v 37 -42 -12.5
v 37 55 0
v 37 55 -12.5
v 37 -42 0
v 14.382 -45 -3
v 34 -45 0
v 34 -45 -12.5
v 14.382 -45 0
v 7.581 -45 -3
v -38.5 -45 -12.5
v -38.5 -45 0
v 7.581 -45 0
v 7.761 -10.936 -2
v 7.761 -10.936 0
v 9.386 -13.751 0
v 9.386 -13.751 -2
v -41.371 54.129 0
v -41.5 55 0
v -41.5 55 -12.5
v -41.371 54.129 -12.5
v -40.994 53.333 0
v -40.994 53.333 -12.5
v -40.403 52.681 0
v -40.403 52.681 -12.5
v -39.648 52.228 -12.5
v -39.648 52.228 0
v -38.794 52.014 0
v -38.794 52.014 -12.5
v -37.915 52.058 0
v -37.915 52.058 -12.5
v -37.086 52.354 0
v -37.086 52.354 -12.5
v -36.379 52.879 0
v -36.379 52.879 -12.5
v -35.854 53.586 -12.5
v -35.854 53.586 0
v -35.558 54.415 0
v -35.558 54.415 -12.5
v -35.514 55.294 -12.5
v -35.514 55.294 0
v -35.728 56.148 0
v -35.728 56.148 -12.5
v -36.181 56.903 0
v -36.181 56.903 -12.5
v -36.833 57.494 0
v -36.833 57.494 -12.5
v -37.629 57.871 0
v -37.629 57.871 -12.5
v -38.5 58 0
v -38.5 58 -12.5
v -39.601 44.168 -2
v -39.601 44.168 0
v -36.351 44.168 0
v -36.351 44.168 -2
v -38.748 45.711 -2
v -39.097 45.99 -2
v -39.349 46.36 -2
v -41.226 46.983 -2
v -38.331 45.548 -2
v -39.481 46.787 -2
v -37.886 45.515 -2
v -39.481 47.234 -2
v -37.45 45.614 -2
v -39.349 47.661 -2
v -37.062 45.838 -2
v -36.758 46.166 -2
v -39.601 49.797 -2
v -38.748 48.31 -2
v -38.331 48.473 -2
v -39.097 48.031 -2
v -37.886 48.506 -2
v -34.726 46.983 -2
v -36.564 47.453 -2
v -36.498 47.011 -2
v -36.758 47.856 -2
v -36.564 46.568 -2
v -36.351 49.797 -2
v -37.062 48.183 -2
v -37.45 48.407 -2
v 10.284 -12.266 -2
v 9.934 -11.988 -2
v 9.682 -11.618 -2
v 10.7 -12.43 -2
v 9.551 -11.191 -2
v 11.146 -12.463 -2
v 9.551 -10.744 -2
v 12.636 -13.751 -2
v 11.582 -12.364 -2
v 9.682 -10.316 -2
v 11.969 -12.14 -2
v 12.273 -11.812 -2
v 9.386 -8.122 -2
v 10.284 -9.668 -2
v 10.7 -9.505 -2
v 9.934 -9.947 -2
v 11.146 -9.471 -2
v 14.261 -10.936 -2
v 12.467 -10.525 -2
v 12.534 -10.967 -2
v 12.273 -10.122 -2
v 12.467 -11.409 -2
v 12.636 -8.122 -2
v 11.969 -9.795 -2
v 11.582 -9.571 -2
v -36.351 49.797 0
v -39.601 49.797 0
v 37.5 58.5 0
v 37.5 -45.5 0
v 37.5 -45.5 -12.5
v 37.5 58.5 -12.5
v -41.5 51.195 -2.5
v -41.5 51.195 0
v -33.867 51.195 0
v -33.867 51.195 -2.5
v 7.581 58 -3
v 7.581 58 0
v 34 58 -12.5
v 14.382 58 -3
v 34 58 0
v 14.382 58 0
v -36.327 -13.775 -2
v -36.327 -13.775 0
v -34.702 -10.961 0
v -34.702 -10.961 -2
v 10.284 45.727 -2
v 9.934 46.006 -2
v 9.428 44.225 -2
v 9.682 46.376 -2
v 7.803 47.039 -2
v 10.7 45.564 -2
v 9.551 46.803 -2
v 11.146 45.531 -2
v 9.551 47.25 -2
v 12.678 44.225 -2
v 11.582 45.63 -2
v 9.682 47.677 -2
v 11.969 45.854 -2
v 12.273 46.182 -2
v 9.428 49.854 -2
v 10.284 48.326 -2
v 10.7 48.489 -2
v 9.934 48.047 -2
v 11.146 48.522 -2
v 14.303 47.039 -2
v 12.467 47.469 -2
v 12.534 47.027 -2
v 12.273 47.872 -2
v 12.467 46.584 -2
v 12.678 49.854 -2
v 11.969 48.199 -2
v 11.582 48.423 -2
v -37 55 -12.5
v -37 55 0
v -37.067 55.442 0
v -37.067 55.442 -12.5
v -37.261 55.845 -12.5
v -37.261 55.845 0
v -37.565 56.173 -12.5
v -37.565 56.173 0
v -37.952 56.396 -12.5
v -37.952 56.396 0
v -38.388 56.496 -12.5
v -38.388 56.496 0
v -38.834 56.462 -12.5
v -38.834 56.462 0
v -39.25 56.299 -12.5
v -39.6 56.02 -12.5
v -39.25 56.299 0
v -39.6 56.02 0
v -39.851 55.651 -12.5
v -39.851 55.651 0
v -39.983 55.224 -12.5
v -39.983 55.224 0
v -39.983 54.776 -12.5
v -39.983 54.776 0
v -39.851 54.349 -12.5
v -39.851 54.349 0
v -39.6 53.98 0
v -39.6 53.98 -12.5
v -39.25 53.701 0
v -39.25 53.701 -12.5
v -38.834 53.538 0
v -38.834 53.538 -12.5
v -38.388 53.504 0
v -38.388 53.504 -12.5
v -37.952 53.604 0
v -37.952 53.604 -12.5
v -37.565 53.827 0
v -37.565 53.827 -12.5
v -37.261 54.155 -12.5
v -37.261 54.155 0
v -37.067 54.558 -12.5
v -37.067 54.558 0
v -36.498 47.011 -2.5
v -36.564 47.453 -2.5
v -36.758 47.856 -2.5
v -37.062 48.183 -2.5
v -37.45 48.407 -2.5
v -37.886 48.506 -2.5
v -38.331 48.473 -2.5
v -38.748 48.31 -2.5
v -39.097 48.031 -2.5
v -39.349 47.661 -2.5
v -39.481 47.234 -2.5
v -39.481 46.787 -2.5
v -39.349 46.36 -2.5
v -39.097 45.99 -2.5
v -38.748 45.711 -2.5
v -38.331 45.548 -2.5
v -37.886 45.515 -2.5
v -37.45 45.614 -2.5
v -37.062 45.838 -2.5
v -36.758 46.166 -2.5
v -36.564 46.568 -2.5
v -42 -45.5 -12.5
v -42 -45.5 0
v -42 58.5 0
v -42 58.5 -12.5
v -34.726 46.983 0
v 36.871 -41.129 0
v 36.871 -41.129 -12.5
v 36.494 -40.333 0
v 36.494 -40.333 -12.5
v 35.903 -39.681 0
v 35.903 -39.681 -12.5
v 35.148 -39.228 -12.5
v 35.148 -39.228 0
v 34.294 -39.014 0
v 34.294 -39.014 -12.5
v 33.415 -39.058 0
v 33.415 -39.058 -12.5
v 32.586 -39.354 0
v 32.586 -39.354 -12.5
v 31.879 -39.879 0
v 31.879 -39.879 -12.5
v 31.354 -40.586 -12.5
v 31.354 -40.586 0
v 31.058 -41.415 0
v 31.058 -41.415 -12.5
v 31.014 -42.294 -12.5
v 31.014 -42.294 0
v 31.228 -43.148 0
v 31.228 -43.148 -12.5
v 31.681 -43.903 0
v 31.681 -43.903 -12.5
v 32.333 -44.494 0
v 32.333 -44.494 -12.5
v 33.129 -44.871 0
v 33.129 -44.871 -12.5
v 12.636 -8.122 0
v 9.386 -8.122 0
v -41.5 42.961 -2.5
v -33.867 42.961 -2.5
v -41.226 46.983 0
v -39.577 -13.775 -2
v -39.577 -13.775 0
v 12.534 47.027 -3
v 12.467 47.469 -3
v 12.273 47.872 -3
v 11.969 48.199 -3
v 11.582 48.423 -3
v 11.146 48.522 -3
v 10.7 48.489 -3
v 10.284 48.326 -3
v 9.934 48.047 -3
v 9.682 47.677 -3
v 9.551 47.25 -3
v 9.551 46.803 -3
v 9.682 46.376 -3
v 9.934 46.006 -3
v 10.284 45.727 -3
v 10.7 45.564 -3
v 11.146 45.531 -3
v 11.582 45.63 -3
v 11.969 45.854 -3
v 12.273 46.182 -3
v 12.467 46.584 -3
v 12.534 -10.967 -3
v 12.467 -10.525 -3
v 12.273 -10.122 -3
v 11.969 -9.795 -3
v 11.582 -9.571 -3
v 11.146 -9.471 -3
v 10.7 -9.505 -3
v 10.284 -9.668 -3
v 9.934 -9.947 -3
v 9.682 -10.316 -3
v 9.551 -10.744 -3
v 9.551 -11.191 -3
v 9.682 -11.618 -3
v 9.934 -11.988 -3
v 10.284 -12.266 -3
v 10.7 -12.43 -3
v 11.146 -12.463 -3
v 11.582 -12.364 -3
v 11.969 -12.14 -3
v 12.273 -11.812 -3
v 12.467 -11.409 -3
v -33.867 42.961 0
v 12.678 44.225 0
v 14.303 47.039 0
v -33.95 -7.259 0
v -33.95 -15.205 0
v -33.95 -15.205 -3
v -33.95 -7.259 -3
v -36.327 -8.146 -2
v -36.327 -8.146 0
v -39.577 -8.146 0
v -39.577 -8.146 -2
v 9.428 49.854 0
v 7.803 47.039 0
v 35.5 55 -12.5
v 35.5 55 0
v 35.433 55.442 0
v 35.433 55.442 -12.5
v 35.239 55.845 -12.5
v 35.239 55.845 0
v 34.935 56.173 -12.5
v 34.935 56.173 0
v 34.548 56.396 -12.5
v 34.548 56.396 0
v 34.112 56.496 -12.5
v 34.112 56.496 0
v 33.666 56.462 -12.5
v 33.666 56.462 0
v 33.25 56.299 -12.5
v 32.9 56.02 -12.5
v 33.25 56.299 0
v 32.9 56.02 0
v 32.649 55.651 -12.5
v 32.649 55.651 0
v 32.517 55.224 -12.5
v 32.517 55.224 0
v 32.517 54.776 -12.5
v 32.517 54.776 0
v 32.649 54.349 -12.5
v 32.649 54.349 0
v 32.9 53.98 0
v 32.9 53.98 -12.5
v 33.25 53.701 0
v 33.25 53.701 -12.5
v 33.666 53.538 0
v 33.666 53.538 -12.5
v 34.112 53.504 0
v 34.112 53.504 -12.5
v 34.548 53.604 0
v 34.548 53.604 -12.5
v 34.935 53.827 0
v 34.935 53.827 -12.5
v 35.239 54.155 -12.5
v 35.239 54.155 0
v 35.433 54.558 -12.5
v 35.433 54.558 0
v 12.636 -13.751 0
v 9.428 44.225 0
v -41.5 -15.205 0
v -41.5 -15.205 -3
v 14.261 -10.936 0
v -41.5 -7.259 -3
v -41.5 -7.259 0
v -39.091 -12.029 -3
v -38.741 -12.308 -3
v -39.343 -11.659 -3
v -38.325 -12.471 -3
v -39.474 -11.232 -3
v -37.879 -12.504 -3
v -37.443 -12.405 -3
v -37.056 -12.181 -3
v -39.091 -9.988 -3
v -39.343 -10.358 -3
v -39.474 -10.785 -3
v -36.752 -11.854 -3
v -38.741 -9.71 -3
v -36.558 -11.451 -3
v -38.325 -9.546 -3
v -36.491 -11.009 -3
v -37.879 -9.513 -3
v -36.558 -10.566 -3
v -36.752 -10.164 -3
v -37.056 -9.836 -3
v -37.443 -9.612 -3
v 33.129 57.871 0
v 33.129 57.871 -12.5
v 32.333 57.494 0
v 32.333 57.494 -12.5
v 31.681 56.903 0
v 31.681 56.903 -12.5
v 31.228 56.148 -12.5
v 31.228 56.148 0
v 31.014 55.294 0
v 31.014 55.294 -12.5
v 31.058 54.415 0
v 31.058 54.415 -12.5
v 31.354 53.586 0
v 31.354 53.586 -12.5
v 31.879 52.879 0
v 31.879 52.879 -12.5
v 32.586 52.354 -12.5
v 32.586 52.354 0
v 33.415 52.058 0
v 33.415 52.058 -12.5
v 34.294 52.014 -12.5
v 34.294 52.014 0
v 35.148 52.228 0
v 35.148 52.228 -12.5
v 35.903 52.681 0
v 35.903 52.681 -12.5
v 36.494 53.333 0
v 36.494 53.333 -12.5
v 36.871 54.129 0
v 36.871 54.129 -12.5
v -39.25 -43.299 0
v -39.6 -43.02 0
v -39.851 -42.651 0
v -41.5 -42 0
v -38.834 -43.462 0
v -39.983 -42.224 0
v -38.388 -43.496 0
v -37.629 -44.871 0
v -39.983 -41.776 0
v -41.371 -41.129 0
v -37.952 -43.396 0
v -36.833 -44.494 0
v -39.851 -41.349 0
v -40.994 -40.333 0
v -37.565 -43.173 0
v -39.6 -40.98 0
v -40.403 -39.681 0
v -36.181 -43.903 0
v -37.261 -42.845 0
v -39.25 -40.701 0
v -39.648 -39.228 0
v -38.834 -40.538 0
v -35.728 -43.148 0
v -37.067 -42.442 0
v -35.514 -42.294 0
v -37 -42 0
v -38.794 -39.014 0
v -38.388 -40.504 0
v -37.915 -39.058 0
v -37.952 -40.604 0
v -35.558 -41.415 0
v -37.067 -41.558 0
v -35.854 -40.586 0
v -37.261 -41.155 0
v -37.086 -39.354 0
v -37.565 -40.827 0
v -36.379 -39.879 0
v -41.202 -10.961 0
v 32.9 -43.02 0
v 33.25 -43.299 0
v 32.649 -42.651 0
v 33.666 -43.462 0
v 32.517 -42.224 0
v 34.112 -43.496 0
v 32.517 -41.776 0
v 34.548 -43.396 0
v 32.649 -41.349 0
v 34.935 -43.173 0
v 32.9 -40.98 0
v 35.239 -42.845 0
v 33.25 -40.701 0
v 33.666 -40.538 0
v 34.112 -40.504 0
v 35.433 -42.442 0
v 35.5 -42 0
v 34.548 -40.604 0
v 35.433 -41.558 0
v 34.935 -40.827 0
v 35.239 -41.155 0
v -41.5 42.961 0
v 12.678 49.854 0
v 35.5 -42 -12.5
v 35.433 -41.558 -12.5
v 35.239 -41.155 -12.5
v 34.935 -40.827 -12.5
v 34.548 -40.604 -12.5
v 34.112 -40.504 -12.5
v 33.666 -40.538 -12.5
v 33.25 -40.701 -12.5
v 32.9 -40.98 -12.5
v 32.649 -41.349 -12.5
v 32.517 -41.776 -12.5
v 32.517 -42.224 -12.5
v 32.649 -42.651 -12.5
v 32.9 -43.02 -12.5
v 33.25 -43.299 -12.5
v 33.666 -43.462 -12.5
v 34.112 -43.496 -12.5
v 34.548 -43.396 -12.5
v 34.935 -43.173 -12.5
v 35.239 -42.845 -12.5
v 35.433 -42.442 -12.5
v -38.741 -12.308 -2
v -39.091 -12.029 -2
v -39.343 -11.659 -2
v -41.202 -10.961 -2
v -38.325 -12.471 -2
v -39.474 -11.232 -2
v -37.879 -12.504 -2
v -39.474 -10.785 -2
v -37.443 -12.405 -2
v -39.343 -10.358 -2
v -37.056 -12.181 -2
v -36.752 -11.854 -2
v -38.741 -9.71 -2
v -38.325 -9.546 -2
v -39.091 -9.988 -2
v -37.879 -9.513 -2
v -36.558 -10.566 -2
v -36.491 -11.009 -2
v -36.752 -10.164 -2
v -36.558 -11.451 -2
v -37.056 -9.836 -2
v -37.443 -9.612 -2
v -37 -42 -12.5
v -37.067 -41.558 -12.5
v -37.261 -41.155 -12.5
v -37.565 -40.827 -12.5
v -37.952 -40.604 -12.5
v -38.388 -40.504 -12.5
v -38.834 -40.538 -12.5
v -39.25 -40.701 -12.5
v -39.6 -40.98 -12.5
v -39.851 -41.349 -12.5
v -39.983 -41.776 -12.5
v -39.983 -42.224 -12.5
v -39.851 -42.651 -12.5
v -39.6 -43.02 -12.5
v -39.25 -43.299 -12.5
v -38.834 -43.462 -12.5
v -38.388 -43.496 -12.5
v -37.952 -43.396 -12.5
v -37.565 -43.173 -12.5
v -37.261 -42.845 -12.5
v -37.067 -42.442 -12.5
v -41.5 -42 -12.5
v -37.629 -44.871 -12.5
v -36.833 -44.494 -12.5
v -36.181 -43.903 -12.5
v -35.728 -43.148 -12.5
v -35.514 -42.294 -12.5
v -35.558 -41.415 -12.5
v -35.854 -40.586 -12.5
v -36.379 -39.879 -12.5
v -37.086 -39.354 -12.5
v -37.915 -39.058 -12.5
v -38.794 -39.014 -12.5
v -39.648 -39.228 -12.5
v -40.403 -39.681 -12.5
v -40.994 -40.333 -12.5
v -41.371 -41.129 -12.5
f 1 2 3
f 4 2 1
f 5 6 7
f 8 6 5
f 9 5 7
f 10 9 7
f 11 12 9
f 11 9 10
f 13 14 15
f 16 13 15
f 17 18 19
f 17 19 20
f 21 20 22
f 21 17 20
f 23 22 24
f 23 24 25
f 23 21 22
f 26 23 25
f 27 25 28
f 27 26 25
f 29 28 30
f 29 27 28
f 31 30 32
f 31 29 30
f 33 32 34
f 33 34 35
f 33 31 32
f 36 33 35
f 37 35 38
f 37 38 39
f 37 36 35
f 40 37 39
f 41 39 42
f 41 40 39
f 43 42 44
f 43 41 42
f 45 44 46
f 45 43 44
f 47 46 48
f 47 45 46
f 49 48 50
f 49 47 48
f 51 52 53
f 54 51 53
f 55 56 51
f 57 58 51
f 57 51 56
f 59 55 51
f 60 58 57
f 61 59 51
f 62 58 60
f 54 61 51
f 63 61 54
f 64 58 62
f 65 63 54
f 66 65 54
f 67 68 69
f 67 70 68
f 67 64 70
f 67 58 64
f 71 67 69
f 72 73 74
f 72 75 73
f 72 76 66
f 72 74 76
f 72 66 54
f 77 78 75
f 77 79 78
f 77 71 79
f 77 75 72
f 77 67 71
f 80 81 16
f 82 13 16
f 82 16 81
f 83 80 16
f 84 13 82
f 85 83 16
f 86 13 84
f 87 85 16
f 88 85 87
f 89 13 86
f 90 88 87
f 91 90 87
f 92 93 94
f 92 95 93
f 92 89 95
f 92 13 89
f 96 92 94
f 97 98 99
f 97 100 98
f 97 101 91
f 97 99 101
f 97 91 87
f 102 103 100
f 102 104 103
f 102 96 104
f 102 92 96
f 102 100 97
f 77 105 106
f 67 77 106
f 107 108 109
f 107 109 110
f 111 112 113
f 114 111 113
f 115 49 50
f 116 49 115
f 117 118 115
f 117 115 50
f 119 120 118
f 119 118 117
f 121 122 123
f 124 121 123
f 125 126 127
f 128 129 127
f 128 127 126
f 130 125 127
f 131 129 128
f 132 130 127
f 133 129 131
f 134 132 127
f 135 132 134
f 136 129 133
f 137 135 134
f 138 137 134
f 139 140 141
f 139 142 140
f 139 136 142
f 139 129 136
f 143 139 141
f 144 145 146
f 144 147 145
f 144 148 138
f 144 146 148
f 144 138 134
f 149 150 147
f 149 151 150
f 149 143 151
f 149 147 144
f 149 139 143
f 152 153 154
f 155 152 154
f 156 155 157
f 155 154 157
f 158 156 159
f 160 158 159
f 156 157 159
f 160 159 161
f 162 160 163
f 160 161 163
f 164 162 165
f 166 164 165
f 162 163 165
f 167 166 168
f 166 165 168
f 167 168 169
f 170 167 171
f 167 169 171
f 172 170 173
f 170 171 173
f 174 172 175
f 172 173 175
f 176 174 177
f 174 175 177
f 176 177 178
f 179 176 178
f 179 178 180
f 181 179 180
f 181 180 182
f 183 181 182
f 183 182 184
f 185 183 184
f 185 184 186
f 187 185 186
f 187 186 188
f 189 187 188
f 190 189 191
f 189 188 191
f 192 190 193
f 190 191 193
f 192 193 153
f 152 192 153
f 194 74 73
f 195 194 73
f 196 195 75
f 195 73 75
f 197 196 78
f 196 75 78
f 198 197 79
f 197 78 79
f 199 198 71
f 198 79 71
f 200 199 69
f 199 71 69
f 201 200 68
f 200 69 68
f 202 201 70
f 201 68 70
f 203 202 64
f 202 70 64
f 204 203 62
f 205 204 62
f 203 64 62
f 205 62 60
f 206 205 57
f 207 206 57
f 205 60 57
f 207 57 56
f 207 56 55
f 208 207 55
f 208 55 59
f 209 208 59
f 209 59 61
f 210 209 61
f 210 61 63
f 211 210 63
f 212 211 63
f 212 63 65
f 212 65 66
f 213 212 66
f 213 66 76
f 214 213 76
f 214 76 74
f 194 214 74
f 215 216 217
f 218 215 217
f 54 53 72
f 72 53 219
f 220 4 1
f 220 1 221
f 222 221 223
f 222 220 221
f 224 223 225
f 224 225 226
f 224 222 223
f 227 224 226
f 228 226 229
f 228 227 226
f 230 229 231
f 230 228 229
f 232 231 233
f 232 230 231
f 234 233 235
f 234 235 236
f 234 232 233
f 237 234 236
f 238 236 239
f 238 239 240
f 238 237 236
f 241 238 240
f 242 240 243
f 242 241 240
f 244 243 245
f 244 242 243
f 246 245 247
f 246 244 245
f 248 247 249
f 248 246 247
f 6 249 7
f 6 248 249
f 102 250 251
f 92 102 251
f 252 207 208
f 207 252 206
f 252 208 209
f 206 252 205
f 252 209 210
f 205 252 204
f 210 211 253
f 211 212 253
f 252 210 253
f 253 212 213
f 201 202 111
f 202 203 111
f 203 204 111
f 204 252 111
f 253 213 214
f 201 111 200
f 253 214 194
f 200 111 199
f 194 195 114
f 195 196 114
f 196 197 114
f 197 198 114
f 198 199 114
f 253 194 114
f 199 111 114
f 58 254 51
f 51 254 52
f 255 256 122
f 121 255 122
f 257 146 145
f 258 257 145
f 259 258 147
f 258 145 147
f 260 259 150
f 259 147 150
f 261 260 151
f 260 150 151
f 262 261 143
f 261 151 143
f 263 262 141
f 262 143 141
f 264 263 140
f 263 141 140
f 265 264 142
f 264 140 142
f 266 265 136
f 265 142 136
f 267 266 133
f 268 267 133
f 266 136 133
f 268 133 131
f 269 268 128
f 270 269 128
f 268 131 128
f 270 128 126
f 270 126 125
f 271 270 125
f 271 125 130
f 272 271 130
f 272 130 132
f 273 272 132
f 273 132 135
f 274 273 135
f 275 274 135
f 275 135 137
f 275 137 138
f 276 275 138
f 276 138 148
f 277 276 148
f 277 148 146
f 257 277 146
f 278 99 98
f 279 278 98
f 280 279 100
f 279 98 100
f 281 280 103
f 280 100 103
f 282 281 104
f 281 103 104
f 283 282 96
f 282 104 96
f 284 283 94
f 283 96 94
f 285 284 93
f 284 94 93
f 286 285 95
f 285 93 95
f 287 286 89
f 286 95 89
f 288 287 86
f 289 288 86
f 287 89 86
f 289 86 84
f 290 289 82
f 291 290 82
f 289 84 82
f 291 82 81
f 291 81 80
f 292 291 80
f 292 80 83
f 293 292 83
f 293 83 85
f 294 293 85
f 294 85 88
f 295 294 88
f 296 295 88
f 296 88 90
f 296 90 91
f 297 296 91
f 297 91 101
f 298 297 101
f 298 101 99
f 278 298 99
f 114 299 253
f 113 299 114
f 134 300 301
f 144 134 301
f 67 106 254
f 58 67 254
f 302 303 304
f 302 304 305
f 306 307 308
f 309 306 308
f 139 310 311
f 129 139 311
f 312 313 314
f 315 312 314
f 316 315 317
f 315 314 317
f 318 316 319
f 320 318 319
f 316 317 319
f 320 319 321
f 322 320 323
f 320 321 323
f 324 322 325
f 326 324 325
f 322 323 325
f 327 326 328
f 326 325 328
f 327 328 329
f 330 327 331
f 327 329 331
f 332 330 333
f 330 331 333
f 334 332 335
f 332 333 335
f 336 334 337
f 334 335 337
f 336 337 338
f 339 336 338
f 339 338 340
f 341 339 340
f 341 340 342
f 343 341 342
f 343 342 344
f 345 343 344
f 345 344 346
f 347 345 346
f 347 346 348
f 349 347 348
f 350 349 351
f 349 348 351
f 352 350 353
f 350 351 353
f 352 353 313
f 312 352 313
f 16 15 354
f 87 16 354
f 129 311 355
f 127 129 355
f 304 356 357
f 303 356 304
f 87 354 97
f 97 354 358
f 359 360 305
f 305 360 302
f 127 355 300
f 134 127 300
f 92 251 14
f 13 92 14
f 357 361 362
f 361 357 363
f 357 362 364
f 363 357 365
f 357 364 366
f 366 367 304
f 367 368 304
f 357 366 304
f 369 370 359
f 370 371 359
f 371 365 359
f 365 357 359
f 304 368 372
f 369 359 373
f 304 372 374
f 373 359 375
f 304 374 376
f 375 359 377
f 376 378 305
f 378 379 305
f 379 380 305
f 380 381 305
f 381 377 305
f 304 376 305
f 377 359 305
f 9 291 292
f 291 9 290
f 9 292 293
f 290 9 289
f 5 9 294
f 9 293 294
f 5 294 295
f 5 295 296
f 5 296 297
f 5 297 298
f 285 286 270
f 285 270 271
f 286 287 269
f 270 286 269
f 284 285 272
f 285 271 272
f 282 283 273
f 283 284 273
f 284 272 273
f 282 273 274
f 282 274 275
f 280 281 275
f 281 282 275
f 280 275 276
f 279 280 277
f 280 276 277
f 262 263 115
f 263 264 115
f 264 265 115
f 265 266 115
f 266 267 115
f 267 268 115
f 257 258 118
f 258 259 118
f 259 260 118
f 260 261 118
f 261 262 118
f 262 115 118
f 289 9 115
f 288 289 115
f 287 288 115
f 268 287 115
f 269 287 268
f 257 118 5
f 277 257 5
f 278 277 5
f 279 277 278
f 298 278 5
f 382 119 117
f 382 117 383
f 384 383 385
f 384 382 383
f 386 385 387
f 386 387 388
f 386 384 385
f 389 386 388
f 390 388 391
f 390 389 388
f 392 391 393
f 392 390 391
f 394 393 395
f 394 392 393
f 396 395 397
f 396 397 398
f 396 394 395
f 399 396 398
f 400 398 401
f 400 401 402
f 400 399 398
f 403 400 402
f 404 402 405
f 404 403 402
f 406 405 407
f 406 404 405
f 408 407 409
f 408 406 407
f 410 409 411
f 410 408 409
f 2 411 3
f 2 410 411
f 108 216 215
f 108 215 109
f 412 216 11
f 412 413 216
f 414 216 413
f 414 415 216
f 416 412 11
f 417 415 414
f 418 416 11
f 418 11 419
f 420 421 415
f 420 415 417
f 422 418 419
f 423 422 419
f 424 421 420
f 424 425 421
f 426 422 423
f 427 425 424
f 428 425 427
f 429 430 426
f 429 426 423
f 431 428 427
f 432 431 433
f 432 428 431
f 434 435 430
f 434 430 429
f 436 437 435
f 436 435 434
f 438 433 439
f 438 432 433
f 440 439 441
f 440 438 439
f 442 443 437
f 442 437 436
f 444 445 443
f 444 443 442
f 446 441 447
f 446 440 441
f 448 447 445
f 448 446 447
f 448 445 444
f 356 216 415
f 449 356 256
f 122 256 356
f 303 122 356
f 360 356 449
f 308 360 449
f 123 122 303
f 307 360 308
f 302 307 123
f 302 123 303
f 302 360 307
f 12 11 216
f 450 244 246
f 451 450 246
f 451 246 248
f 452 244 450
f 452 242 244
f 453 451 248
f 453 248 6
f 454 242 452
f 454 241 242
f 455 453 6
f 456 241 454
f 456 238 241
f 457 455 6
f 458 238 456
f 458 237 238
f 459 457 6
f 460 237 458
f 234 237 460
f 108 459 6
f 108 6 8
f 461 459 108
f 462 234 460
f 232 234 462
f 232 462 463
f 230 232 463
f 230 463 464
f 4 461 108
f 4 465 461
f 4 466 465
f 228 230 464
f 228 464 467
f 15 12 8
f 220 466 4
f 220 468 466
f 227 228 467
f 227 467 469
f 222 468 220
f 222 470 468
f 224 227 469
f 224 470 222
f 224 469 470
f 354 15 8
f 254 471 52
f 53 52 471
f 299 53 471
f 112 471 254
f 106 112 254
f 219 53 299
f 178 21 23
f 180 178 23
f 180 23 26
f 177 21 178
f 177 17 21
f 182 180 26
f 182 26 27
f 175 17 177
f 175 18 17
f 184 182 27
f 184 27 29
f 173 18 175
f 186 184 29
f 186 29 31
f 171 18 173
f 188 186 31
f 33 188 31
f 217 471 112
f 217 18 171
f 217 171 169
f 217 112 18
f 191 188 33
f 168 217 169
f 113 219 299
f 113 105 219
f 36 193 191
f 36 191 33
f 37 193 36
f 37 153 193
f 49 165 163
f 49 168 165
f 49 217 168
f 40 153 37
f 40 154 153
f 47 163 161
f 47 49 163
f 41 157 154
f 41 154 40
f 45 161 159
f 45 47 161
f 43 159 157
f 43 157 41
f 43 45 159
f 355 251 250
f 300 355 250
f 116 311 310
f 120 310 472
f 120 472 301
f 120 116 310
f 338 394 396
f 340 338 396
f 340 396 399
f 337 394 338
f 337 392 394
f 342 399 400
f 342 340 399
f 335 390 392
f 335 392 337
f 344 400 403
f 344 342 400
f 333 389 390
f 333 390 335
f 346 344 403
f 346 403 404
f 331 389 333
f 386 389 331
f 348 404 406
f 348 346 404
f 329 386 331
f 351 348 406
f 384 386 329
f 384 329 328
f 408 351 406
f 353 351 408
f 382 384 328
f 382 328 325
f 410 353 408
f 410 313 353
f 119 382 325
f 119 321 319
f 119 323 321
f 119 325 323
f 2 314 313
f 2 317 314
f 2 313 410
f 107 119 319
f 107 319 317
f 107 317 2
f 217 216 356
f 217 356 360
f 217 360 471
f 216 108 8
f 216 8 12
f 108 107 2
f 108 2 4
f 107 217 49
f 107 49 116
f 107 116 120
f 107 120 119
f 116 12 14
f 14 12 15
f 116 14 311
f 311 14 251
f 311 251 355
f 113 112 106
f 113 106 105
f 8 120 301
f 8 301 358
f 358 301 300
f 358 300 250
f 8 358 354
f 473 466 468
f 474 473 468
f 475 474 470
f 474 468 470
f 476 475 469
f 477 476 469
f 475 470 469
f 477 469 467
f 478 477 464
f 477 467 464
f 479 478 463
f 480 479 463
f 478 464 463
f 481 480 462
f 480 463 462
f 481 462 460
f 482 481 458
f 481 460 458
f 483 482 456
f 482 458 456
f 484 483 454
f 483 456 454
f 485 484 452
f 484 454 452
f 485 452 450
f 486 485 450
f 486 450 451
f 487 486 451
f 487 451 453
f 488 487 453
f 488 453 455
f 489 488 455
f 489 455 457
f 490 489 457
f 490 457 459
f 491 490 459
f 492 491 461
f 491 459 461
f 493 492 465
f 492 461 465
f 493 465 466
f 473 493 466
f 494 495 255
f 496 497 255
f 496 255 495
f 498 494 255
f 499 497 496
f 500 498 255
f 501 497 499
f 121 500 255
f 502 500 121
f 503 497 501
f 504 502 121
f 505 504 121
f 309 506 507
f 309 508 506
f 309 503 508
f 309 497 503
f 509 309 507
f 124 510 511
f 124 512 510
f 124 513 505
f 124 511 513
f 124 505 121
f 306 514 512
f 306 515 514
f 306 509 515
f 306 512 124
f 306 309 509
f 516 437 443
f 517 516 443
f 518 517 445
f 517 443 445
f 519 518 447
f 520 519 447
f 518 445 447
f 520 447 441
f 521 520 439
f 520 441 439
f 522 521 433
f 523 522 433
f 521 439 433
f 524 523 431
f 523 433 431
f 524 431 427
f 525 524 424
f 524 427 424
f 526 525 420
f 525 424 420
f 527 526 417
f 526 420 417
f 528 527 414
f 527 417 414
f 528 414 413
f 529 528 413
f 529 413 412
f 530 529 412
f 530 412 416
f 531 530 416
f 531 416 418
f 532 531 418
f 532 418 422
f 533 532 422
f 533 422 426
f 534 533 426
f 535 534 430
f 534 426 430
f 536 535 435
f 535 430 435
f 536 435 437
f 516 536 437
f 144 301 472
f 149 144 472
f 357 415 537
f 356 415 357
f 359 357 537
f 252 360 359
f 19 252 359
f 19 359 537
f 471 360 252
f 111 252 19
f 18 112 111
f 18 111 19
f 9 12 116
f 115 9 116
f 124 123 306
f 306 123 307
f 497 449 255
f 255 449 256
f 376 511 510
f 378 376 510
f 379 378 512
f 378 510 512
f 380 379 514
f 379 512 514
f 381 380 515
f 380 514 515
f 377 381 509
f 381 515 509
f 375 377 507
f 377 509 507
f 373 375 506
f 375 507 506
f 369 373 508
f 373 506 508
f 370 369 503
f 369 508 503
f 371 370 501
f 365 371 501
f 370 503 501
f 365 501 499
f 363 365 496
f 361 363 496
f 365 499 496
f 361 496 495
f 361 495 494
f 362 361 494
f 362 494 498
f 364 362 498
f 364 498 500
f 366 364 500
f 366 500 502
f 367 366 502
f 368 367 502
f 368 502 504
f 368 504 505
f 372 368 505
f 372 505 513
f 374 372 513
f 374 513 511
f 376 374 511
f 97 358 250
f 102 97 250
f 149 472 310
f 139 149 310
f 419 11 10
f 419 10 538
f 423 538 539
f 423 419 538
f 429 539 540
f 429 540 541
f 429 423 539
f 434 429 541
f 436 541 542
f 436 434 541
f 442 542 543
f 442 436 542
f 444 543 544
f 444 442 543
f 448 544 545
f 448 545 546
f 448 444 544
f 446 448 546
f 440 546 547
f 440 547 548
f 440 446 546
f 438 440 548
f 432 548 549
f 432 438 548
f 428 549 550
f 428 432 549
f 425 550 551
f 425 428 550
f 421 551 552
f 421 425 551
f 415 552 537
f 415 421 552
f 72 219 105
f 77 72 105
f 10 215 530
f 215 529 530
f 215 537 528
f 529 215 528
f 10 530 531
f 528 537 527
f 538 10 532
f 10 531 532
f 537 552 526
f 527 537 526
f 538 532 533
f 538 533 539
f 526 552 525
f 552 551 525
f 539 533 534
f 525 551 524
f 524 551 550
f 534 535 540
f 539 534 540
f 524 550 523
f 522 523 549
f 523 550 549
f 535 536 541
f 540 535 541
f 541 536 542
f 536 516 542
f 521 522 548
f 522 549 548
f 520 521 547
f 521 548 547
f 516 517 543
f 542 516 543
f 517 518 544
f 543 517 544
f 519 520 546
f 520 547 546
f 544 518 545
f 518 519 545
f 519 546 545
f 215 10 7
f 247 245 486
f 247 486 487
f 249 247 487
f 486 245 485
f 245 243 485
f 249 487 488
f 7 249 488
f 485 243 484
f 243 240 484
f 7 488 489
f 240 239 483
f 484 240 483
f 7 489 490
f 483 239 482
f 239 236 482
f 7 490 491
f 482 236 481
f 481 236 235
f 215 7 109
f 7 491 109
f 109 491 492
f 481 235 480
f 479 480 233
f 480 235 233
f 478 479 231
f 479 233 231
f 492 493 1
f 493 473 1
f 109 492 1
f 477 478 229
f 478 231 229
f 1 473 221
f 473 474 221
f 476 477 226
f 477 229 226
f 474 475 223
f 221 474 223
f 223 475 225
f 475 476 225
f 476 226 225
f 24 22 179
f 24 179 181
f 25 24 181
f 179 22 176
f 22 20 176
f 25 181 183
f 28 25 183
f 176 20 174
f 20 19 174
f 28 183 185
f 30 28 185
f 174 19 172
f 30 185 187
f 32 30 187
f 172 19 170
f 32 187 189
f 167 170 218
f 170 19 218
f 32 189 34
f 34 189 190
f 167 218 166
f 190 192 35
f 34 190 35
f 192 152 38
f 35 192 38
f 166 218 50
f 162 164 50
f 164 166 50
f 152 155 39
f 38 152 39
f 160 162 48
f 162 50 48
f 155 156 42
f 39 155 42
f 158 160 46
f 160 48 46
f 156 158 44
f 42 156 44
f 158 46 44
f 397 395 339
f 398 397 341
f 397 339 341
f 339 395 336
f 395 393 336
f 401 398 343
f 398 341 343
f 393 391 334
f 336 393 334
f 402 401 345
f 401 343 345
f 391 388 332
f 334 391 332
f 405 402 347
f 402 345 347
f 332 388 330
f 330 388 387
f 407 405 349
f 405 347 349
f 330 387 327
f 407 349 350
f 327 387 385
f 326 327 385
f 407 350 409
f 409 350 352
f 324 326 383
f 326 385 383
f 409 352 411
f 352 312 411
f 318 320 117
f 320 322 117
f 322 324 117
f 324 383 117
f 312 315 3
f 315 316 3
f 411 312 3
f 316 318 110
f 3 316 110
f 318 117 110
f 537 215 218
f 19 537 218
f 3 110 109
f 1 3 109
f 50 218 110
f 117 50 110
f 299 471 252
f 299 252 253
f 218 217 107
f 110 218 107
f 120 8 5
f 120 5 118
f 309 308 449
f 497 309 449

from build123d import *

# Parameters (mm, degrees)
SKETCH007_W     = 79.5
SKETCH007_H     = 104
SKETCH007_R     = 1.5
PAD002_DEPTH    = 12.5
SKETCH006_W     = 8.021301
SKETCH006_H     = 8.234894
SKETCH006_R     = 1.5
PAD001_DEPTH    = 2.5
POCKET005_DEPTH = 2
SKETCH033_W     = 7.946812
SKETCH033_H     = 7.946812
SKETCH033_R     = 1.5
PAD003_DEPTH    = 3
SKETCH034_W     = 6.801386
SKETCH034_H     = 103.670945
SKETCH034_R     = 1.5
PAD004_DEPTH    = 3
POCKET006_DEPTH = 2
POCKET007_DEPTH = 2
POCKET008_DEPTH = 2


with BuildPart() as part:
    # Sketch007 → Pad002 (new body)
    with BuildSketch(Plane.XY):
        with Locations((-2.25, 6.5)):
            Rectangle(SKETCH007_W, SKETCH007_H)
        with Locations((-38.5, 55)):
            Circle(SKETCH007_R, mode=Mode.SUBTRACT)
        with Locations((34, 55)):
            Circle(SKETCH007_R, mode=Mode.SUBTRACT)
        with Locations((-38.5, -42)):
            Circle(SKETCH007_R, mode=Mode.SUBTRACT)
        with Locations((34, -42)):
            Circle(SKETCH007_R, mode=Mode.SUBTRACT)
        with BuildLine():
            Line((34, -45), (-38.5, -45))
            ThreePointArc((-38.5, -45), (-36.37868, -39.87868), (-41.5, -42))
            Line((-41.5, -42), (-41.5, 55))
            ThreePointArc((-41.5, 55), (-36.37868, 52.87868), (-38.5, 58))
            Line((-38.5, 58), (34, 58))
            ThreePointArc((34, 58), (31.87868, 52.87868), (37, 55))
            Line((37, 55), (37, -42))
            ThreePointArc((37, -42), (31.87868, -39.87868), (34, -45))
        make_face(mode=Mode.SUBTRACT)
    extrude(amount=-PAD002_DEPTH)

    # Sketch006 → Pad001 (join)
    with BuildSketch(Plane.XY):
        with Locations((-37.87762, 47.077984)):
            Rectangle(SKETCH006_W, SKETCH006_H)
        with Locations((-37.997646, 47.010536)):
            Circle(SKETCH006_R, mode=Mode.SUBTRACT)
    extrude(amount=-PAD001_DEPTH)

    # Sketch032 (on Face23 of Pad001) → Pocket005 (cut)
    with BuildSketch(Plane.XY):
        Polygon((-34.726036, 46.982567), (-36.351036, 49.79715), (-39.601036, 49.79715), (-41.226036, 46.982567), (-39.601036, 44.167984), (-36.351036, 44.167984), align=None)
    extrude(amount=-POCKET005_DEPTH, mode=Mode.SUBTRACT)

    # Sketch033 → Pad003 (join)
    with BuildSketch(Plane.XY):
        with Locations((-37.923063, -11.232048)):
            Rectangle(SKETCH033_W, SKETCH033_H)
        with Locations((-37.99107, -11.008605)):
            Circle(SKETCH033_R, mode=Mode.SUBTRACT)
    extrude(amount=-PAD003_DEPTH)

    # Sketch034 → Pad004 (join)
    with BuildSketch(Plane.XY):
        with Locations((10.981288, 6.512218)):
            Rectangle(SKETCH034_W, SKETCH034_H)
        with Locations((11.033937, 47.026531)):
            Circle(SKETCH034_R, mode=Mode.SUBTRACT)
        with Locations((11.033937, -10.967275)):
            Circle(SKETCH034_R, mode=Mode.SUBTRACT)
    extrude(amount=-PAD004_DEPTH)

    # Sketch035 (on Face34 of Pad004) → Pocket006 (cut)
    with BuildSketch(Plane.XY):
        Polygon((-36.326836, -8.14599), (-39.576836, -8.14599), (-41.201836, -10.960573), (-39.576836, -13.775156), (-36.326836, -13.775156), (-34.701836, -10.960573), align=None)
    extrude(amount=-POCKET006_DEPTH, mode=Mode.SUBTRACT)

    # Sketch036 (on Face26 of Pocket006) → Pocket007 (cut)
    with BuildSketch(Plane.XY):
        Polygon((12.678073, 49.85376), (9.428073, 49.85376), (7.803073, 47.039177), (9.428073, 44.224594), (12.678073, 44.224594), (14.303073, 47.039177), align=None)
    extrude(amount=-POCKET007_DEPTH, mode=Mode.SUBTRACT)

    # Sketch037 (on Face26 of Pocket007) → Pocket008 (cut)
    with BuildSketch(Plane.XY):
        Polygon((12.636199, -8.121596), (9.386199, -8.121596), (7.761199, -10.936179), (9.386199, -13.750762), (12.636199, -13.750762), (14.261199, -10.936179), align=None)
    extrude(amount=-POCKET008_DEPTH, mode=Mode.SUBTRACT)


solid = part.part
